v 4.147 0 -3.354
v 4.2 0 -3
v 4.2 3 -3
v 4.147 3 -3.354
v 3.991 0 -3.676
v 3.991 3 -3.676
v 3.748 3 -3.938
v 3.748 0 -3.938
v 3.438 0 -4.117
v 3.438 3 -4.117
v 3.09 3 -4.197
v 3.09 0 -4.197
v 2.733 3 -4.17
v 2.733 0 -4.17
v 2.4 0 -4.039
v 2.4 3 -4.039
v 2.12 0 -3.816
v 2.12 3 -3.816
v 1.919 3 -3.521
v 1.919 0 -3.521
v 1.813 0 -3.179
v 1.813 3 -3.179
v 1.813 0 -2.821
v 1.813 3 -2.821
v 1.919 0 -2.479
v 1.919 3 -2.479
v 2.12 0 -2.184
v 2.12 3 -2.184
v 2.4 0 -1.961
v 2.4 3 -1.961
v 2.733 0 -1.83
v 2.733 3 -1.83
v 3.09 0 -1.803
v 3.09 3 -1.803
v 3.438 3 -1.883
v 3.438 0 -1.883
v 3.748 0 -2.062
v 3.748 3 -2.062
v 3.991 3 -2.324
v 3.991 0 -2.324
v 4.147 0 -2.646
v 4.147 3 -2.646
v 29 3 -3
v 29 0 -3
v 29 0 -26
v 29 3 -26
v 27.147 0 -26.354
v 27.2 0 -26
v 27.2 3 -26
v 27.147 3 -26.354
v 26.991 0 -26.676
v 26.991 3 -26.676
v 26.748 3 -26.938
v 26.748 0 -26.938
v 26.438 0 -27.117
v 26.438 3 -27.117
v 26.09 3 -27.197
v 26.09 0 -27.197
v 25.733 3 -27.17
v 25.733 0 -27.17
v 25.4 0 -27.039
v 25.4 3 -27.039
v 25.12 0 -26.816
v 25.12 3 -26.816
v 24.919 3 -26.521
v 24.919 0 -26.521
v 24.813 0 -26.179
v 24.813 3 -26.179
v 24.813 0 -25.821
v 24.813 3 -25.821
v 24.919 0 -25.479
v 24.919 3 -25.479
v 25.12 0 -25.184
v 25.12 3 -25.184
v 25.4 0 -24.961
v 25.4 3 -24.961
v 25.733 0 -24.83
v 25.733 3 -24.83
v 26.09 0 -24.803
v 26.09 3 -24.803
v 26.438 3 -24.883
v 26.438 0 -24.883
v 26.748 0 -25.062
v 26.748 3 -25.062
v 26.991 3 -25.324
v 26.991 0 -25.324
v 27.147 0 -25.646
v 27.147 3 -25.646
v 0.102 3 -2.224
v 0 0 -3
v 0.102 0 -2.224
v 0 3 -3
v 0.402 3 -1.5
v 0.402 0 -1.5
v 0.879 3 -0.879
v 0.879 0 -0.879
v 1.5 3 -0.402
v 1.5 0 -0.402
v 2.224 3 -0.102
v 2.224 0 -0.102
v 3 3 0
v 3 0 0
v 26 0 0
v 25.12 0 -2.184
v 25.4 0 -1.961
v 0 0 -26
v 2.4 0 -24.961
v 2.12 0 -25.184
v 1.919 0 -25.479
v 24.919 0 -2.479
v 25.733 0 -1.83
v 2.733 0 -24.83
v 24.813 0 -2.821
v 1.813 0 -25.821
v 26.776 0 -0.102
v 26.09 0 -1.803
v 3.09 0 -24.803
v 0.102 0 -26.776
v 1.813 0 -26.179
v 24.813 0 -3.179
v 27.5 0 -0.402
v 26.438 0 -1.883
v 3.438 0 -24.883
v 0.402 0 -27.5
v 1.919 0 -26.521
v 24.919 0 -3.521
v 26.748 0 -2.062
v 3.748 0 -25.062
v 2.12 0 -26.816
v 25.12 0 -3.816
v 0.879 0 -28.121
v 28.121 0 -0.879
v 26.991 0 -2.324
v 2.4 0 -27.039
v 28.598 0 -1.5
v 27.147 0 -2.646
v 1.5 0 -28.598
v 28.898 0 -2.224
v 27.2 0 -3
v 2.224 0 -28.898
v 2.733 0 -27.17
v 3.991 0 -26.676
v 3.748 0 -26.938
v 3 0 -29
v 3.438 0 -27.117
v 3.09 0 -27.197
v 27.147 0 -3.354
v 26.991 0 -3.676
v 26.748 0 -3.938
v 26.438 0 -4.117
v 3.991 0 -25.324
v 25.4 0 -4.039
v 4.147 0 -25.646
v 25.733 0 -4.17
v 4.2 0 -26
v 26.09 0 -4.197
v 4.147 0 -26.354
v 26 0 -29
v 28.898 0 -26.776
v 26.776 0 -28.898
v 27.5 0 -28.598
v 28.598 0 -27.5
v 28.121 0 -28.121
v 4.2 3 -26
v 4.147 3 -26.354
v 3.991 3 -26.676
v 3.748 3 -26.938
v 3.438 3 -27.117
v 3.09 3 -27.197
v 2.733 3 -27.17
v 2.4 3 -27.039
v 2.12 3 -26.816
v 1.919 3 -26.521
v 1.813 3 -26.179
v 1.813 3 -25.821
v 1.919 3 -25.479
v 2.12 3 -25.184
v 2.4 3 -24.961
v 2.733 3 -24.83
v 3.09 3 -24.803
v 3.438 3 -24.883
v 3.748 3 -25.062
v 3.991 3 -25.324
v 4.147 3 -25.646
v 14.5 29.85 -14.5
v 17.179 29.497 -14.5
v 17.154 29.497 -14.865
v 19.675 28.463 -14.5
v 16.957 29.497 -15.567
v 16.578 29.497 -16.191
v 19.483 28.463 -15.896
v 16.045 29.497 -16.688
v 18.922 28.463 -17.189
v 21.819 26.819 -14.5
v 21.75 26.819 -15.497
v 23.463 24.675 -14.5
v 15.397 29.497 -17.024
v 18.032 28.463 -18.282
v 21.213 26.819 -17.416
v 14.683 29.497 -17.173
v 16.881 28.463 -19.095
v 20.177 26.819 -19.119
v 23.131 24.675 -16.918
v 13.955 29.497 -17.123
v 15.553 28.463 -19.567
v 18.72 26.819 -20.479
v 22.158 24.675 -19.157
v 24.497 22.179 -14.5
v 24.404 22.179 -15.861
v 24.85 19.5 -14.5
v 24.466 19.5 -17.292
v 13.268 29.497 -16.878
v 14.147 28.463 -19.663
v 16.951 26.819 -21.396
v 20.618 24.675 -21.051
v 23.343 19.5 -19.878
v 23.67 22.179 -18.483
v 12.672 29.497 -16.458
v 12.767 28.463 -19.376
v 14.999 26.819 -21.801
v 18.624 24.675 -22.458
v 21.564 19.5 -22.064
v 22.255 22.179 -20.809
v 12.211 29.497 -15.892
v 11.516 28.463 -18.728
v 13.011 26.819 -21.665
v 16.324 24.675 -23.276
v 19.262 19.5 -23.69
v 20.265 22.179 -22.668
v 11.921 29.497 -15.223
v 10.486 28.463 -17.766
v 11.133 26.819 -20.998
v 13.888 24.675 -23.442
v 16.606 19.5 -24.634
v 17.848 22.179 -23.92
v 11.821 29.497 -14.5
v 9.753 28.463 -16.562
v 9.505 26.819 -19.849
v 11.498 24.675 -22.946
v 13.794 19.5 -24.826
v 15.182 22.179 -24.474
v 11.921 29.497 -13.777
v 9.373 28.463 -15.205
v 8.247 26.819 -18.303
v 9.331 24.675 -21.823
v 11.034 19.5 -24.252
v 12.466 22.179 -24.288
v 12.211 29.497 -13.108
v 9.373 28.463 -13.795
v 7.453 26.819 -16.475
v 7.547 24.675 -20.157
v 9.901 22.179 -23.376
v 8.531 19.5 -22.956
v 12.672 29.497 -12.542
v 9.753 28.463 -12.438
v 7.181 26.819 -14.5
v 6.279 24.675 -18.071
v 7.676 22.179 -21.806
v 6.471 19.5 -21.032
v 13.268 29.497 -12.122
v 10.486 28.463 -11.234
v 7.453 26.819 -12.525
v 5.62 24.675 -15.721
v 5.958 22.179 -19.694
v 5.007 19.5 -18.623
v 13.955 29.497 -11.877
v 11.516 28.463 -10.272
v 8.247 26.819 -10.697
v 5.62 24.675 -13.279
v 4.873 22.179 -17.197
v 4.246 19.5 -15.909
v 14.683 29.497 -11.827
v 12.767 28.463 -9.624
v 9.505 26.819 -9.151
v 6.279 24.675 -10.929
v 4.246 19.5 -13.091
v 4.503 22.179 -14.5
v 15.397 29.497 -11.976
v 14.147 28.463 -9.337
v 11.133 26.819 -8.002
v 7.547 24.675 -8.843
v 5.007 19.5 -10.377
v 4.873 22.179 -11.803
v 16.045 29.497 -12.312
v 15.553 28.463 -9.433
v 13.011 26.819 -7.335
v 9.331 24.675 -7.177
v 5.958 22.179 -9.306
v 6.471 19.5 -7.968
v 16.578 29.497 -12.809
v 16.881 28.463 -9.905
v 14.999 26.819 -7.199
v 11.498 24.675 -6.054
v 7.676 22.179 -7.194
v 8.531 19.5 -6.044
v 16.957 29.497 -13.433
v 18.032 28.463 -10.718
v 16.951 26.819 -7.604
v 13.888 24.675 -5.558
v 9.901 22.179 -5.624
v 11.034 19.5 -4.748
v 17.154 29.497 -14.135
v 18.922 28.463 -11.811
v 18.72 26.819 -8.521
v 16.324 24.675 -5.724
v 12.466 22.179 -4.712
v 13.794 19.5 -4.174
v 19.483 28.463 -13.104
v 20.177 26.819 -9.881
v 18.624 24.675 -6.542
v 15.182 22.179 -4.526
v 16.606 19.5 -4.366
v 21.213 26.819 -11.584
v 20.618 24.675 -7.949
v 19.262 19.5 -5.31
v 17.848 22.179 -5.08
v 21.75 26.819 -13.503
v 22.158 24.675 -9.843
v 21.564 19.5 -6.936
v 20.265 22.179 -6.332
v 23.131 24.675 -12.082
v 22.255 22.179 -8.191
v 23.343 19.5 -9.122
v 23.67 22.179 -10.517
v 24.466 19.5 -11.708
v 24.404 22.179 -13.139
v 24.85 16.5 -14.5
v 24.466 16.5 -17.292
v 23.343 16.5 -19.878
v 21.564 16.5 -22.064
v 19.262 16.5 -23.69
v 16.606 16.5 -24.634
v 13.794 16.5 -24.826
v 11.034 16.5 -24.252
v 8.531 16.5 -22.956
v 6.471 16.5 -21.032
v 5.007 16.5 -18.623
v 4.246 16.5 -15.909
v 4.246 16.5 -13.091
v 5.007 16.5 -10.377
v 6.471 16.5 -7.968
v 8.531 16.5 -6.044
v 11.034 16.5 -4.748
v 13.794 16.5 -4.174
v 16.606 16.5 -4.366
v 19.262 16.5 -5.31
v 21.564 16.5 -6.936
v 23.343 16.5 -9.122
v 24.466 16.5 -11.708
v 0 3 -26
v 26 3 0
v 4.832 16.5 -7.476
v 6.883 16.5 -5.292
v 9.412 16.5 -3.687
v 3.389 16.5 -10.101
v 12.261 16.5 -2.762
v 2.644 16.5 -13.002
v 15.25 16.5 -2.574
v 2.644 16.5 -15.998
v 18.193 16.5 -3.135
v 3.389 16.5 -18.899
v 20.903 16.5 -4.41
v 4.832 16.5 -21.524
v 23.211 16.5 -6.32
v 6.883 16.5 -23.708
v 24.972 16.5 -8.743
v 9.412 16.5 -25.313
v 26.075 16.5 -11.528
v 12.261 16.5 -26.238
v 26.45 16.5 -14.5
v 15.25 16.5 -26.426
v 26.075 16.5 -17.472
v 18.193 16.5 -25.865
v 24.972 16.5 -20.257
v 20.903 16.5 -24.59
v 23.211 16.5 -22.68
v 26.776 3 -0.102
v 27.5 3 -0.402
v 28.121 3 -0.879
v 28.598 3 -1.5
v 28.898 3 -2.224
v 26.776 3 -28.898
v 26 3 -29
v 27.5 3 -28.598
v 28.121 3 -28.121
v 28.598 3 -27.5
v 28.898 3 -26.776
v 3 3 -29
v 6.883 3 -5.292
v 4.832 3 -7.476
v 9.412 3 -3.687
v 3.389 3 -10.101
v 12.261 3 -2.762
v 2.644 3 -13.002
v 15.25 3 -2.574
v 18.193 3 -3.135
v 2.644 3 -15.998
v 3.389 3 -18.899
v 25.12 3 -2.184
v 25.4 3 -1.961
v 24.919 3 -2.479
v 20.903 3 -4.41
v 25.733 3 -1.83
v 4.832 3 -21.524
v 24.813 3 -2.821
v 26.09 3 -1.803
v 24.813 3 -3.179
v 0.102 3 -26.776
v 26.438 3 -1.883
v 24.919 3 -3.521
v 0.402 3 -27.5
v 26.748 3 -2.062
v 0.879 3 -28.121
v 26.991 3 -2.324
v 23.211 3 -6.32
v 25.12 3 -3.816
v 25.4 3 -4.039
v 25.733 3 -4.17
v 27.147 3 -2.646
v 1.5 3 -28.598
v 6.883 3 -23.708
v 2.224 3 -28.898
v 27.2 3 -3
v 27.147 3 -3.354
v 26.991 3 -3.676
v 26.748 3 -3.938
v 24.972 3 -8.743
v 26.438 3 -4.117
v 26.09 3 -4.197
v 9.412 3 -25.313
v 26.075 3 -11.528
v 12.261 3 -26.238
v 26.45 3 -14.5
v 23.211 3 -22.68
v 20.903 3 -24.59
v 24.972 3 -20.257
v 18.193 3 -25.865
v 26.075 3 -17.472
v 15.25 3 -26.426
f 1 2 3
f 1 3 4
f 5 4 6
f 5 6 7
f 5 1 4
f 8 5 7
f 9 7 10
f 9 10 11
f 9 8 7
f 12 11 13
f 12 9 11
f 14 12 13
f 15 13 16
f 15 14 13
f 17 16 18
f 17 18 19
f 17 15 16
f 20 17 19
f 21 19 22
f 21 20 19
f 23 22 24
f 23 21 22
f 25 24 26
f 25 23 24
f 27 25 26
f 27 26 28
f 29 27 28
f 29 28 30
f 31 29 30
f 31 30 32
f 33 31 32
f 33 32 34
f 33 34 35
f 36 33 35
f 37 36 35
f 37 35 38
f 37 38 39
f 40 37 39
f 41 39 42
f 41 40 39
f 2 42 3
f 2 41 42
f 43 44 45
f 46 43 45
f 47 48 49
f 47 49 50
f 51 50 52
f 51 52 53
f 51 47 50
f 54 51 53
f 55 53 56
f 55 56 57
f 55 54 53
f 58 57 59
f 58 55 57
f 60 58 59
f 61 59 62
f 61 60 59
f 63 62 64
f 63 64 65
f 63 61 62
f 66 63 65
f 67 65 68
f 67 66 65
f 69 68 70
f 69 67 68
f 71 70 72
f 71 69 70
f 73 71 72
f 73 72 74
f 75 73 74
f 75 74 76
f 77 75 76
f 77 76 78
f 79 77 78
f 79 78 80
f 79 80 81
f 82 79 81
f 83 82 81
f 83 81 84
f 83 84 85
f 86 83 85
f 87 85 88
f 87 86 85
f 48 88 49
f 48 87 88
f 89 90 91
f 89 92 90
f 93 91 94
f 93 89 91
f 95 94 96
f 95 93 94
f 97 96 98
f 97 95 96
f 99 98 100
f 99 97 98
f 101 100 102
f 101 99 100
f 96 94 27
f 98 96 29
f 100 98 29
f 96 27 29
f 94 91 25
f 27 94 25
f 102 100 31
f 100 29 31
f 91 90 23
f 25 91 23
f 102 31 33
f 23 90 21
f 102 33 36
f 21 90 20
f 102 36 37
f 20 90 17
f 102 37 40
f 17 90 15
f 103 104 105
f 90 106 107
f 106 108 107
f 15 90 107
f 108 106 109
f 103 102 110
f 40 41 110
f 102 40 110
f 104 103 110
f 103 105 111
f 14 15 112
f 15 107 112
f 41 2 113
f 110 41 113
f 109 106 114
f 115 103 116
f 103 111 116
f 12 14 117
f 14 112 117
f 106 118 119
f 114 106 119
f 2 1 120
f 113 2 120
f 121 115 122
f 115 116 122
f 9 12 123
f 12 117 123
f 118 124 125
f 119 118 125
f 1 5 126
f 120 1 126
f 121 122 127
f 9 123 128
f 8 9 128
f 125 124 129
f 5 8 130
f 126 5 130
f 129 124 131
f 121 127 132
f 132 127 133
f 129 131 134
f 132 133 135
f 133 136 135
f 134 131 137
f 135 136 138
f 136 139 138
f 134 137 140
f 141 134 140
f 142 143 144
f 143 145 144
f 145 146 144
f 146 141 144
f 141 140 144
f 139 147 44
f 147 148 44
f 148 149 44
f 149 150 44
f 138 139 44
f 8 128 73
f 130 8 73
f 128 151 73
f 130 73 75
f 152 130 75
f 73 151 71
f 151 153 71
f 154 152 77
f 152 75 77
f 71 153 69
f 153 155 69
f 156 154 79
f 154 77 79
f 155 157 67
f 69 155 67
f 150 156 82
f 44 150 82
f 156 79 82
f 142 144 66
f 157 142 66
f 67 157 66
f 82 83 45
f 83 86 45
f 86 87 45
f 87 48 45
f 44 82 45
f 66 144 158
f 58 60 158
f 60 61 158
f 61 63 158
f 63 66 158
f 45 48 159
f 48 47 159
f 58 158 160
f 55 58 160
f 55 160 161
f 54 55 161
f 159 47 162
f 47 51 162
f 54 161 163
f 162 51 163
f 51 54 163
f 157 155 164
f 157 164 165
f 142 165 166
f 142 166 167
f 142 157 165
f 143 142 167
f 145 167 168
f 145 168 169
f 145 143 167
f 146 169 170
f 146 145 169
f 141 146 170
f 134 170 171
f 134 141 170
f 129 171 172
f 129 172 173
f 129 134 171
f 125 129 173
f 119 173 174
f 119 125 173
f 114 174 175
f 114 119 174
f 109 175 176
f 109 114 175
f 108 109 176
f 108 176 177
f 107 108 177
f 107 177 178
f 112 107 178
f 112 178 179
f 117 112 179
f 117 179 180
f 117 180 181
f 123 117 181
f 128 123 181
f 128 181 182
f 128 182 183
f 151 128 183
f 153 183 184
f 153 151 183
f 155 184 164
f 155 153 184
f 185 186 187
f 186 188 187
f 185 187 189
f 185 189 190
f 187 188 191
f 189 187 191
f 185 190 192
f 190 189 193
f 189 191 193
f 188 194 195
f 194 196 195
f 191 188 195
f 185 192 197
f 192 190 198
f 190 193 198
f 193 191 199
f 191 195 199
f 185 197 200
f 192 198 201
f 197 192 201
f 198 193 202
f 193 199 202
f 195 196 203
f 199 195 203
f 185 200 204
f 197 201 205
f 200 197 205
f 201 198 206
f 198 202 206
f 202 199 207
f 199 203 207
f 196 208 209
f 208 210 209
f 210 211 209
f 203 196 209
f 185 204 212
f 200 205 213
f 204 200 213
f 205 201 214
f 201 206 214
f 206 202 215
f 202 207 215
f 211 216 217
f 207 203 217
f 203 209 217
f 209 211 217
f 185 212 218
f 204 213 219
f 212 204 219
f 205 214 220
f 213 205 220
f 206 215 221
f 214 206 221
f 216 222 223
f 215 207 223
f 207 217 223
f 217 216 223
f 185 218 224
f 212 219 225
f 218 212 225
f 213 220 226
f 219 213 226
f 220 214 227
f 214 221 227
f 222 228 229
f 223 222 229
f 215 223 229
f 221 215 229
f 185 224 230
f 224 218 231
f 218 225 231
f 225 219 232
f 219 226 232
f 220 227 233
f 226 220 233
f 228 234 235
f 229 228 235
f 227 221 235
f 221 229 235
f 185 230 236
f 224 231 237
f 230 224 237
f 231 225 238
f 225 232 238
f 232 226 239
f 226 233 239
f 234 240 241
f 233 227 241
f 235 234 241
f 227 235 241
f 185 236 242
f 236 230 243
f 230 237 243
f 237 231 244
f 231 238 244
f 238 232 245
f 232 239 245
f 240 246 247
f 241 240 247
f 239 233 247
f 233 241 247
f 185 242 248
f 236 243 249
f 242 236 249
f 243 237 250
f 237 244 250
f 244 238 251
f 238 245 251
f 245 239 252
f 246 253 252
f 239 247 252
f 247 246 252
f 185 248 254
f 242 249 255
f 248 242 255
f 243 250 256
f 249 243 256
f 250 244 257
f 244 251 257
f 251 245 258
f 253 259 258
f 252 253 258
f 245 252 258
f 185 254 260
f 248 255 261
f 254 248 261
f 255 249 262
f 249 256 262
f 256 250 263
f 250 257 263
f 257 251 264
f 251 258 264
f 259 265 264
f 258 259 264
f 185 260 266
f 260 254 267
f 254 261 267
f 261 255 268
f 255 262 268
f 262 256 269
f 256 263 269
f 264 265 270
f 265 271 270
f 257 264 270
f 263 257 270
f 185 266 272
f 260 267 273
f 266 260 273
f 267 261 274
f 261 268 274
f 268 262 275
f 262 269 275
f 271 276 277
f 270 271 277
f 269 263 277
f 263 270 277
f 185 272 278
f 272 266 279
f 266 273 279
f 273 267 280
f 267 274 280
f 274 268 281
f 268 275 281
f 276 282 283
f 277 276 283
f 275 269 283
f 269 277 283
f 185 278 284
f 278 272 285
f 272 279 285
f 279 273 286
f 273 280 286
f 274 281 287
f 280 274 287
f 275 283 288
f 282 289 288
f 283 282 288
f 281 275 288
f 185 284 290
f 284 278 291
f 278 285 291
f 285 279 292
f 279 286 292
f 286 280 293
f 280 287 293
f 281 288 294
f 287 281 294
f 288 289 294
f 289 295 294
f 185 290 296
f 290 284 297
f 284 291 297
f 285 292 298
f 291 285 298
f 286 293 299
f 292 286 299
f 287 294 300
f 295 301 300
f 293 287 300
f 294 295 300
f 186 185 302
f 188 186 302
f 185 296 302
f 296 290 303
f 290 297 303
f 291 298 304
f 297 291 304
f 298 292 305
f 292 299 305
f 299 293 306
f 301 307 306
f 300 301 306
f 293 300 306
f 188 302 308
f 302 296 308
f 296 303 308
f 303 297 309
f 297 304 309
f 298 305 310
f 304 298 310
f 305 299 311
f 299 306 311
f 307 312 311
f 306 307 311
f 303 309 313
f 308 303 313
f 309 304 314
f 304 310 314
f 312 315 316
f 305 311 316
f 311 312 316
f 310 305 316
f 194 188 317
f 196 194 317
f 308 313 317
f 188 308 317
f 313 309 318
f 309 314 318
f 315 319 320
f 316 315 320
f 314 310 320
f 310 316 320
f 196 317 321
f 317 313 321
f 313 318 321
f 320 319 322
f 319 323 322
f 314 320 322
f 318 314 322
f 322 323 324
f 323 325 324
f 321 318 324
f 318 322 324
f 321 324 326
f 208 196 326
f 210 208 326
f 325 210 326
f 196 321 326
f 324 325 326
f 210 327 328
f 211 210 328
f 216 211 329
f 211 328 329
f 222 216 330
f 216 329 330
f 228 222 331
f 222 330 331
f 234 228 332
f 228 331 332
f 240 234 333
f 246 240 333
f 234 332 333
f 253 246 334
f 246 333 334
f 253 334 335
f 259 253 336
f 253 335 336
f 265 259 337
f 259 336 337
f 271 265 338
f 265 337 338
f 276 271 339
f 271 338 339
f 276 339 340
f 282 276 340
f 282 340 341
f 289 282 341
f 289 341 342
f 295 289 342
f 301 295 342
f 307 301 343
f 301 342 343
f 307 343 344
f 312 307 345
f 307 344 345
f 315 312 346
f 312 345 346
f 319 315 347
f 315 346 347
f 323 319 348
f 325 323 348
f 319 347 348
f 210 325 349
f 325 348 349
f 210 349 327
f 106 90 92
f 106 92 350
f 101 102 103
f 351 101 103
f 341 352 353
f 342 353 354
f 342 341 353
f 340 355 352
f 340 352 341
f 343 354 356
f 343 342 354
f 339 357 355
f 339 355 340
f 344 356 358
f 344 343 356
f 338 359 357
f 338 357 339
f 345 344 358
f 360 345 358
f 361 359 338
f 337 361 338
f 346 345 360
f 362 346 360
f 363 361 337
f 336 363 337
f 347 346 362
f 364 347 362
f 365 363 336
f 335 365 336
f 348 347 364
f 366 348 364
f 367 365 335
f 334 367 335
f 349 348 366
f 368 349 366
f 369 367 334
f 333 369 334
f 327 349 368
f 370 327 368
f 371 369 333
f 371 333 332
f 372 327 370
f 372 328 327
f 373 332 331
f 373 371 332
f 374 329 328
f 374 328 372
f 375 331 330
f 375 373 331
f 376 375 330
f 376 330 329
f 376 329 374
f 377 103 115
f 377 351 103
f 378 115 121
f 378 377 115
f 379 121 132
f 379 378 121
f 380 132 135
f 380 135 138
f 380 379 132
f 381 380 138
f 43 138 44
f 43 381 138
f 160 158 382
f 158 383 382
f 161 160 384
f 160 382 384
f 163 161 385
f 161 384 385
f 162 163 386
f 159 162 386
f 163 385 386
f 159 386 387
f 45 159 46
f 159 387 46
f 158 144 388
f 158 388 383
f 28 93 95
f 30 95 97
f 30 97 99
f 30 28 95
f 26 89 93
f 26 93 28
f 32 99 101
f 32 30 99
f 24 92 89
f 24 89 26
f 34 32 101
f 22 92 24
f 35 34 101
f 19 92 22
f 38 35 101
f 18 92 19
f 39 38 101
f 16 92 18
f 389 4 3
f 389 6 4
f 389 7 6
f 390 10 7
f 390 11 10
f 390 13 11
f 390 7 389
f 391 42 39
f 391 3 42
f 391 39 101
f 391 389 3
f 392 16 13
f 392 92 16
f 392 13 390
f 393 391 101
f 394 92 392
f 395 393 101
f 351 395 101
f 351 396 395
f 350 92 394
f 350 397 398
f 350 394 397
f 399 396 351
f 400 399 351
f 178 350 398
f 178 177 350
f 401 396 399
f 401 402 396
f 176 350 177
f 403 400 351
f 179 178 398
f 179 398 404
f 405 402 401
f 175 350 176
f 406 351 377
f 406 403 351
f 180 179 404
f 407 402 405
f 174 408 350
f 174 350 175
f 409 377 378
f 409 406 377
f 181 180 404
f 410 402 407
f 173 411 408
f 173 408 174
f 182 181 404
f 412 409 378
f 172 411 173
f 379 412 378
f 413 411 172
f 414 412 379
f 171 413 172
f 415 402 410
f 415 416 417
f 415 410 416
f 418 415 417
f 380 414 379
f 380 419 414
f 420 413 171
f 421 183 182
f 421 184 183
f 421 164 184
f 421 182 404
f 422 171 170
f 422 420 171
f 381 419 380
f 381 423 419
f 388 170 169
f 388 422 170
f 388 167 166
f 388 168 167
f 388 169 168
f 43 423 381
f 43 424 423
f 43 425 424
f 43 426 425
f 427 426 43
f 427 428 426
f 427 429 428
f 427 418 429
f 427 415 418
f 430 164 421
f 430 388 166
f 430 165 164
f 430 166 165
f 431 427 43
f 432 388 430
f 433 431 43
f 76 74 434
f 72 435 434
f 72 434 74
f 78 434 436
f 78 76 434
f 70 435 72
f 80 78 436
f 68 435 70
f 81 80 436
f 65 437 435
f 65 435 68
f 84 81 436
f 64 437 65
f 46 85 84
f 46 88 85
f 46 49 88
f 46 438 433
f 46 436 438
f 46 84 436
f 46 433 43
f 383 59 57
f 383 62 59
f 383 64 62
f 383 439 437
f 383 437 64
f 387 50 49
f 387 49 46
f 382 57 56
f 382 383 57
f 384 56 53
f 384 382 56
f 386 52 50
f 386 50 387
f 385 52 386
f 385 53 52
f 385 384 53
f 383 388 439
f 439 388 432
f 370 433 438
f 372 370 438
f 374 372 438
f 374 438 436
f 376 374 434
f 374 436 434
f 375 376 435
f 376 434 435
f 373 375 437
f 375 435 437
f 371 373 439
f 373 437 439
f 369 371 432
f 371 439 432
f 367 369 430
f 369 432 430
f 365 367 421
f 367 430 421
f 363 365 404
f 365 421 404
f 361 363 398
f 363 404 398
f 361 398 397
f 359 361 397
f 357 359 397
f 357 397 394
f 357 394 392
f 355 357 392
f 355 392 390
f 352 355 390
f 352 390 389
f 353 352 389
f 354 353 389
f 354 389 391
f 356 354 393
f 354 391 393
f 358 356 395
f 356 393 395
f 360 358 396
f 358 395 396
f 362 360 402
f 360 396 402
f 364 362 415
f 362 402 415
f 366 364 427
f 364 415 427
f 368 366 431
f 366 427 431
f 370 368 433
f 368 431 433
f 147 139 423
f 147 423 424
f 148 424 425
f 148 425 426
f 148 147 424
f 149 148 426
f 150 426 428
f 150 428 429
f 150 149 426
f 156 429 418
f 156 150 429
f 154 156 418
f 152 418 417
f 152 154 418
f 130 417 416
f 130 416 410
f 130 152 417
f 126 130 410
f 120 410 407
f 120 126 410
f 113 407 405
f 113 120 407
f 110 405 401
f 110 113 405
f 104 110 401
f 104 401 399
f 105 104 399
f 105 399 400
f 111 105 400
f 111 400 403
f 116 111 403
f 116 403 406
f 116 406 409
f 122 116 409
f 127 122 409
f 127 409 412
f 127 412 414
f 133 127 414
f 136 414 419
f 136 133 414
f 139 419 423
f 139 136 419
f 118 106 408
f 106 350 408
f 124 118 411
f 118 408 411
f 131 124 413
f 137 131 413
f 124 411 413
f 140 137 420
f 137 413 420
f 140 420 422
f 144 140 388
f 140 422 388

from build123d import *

# Parameters (mm, degrees)
SKETCH1_W           = 29
SKETCH1_H           = 29
SKETCH1_R           = 1.2
BOSS_EXTRUDE1_DEPTH = 3
FILLET1_R           = 3
SKETCH2_R           = 11.95
BOSS_EXTRUDE2_DEPTH = 13.5
SKETCH3_R           = 10.35
BOSS_EXTRUDE3_DEPTH = 3


with BuildPart() as part:
    # Sketch1 → Boss-Extrude1 (new body)
    with BuildSketch(Plane(origin=(0, 0, 0), x_dir=(1, 0, 0), z_dir=(0, 1, 0))):
        with Locations((14.5, 14.5)):
            Rectangle(SKETCH1_W, SKETCH1_H)
        with Locations((3, 26)):
            Circle(SKETCH1_R, mode=Mode.SUBTRACT)
        with Locations((26, 26)):
            Circle(SKETCH1_R, mode=Mode.SUBTRACT)
        with Locations((26, 3)):
            Circle(SKETCH1_R, mode=Mode.SUBTRACT)
        with Locations((3, 3)):
            Circle(SKETCH1_R, mode=Mode.SUBTRACT)
    extrude(amount=BOSS_EXTRUDE1_DEPTH)

    # Fillet1
    fillet1_edges = [part.edges().sort_by_distance(p)[0] for p in [
        (0, 1.5, -29),
        (29, 1.5, -29),
        (29, 1.5, 0),
        (0, 1.5, 0),
    ]]
    fillet(fillet1_edges, radius=FILLET1_R)

    # Sketch2 → Boss-Extrude2 (add)
    with BuildSketch(Plane(origin=(0, 3, 0), x_dir=(1, 0, 0), z_dir=(0, 1, 0))):
        with Locations((14.5, 14.5)):
            Circle(SKETCH2_R)
    extrude(amount=BOSS_EXTRUDE2_DEPTH)

    # Sketch3 → Boss-Extrude3 (add)
    with BuildSketch(Plane(origin=(0, 16.5, 0), x_dir=(1, 0, 0), z_dir=(0, 1, 0))):
        with Locations((14.5, 14.5)):
            Circle(SKETCH3_R)
    extrude(amount=BOSS_EXTRUDE3_DEPTH)

    # Sketch4 → Revolve1 (revolve)
    with BuildSketch(Plane.XY.offset(-14.5)):
        with BuildLine():
            Line((14.5, 19.5), (14.5, 29.85))
            ThreePointArc((14.5, 29.85), (21.818555185, 26.818555185), (24.85, 19.5))
            Line((24.85, 19.5), (14.5, 19.5))
        make_face()
    revolve(axis=Axis((14.5, 19.5, -14.5), (0, 1, 0)))


solid = part.part
